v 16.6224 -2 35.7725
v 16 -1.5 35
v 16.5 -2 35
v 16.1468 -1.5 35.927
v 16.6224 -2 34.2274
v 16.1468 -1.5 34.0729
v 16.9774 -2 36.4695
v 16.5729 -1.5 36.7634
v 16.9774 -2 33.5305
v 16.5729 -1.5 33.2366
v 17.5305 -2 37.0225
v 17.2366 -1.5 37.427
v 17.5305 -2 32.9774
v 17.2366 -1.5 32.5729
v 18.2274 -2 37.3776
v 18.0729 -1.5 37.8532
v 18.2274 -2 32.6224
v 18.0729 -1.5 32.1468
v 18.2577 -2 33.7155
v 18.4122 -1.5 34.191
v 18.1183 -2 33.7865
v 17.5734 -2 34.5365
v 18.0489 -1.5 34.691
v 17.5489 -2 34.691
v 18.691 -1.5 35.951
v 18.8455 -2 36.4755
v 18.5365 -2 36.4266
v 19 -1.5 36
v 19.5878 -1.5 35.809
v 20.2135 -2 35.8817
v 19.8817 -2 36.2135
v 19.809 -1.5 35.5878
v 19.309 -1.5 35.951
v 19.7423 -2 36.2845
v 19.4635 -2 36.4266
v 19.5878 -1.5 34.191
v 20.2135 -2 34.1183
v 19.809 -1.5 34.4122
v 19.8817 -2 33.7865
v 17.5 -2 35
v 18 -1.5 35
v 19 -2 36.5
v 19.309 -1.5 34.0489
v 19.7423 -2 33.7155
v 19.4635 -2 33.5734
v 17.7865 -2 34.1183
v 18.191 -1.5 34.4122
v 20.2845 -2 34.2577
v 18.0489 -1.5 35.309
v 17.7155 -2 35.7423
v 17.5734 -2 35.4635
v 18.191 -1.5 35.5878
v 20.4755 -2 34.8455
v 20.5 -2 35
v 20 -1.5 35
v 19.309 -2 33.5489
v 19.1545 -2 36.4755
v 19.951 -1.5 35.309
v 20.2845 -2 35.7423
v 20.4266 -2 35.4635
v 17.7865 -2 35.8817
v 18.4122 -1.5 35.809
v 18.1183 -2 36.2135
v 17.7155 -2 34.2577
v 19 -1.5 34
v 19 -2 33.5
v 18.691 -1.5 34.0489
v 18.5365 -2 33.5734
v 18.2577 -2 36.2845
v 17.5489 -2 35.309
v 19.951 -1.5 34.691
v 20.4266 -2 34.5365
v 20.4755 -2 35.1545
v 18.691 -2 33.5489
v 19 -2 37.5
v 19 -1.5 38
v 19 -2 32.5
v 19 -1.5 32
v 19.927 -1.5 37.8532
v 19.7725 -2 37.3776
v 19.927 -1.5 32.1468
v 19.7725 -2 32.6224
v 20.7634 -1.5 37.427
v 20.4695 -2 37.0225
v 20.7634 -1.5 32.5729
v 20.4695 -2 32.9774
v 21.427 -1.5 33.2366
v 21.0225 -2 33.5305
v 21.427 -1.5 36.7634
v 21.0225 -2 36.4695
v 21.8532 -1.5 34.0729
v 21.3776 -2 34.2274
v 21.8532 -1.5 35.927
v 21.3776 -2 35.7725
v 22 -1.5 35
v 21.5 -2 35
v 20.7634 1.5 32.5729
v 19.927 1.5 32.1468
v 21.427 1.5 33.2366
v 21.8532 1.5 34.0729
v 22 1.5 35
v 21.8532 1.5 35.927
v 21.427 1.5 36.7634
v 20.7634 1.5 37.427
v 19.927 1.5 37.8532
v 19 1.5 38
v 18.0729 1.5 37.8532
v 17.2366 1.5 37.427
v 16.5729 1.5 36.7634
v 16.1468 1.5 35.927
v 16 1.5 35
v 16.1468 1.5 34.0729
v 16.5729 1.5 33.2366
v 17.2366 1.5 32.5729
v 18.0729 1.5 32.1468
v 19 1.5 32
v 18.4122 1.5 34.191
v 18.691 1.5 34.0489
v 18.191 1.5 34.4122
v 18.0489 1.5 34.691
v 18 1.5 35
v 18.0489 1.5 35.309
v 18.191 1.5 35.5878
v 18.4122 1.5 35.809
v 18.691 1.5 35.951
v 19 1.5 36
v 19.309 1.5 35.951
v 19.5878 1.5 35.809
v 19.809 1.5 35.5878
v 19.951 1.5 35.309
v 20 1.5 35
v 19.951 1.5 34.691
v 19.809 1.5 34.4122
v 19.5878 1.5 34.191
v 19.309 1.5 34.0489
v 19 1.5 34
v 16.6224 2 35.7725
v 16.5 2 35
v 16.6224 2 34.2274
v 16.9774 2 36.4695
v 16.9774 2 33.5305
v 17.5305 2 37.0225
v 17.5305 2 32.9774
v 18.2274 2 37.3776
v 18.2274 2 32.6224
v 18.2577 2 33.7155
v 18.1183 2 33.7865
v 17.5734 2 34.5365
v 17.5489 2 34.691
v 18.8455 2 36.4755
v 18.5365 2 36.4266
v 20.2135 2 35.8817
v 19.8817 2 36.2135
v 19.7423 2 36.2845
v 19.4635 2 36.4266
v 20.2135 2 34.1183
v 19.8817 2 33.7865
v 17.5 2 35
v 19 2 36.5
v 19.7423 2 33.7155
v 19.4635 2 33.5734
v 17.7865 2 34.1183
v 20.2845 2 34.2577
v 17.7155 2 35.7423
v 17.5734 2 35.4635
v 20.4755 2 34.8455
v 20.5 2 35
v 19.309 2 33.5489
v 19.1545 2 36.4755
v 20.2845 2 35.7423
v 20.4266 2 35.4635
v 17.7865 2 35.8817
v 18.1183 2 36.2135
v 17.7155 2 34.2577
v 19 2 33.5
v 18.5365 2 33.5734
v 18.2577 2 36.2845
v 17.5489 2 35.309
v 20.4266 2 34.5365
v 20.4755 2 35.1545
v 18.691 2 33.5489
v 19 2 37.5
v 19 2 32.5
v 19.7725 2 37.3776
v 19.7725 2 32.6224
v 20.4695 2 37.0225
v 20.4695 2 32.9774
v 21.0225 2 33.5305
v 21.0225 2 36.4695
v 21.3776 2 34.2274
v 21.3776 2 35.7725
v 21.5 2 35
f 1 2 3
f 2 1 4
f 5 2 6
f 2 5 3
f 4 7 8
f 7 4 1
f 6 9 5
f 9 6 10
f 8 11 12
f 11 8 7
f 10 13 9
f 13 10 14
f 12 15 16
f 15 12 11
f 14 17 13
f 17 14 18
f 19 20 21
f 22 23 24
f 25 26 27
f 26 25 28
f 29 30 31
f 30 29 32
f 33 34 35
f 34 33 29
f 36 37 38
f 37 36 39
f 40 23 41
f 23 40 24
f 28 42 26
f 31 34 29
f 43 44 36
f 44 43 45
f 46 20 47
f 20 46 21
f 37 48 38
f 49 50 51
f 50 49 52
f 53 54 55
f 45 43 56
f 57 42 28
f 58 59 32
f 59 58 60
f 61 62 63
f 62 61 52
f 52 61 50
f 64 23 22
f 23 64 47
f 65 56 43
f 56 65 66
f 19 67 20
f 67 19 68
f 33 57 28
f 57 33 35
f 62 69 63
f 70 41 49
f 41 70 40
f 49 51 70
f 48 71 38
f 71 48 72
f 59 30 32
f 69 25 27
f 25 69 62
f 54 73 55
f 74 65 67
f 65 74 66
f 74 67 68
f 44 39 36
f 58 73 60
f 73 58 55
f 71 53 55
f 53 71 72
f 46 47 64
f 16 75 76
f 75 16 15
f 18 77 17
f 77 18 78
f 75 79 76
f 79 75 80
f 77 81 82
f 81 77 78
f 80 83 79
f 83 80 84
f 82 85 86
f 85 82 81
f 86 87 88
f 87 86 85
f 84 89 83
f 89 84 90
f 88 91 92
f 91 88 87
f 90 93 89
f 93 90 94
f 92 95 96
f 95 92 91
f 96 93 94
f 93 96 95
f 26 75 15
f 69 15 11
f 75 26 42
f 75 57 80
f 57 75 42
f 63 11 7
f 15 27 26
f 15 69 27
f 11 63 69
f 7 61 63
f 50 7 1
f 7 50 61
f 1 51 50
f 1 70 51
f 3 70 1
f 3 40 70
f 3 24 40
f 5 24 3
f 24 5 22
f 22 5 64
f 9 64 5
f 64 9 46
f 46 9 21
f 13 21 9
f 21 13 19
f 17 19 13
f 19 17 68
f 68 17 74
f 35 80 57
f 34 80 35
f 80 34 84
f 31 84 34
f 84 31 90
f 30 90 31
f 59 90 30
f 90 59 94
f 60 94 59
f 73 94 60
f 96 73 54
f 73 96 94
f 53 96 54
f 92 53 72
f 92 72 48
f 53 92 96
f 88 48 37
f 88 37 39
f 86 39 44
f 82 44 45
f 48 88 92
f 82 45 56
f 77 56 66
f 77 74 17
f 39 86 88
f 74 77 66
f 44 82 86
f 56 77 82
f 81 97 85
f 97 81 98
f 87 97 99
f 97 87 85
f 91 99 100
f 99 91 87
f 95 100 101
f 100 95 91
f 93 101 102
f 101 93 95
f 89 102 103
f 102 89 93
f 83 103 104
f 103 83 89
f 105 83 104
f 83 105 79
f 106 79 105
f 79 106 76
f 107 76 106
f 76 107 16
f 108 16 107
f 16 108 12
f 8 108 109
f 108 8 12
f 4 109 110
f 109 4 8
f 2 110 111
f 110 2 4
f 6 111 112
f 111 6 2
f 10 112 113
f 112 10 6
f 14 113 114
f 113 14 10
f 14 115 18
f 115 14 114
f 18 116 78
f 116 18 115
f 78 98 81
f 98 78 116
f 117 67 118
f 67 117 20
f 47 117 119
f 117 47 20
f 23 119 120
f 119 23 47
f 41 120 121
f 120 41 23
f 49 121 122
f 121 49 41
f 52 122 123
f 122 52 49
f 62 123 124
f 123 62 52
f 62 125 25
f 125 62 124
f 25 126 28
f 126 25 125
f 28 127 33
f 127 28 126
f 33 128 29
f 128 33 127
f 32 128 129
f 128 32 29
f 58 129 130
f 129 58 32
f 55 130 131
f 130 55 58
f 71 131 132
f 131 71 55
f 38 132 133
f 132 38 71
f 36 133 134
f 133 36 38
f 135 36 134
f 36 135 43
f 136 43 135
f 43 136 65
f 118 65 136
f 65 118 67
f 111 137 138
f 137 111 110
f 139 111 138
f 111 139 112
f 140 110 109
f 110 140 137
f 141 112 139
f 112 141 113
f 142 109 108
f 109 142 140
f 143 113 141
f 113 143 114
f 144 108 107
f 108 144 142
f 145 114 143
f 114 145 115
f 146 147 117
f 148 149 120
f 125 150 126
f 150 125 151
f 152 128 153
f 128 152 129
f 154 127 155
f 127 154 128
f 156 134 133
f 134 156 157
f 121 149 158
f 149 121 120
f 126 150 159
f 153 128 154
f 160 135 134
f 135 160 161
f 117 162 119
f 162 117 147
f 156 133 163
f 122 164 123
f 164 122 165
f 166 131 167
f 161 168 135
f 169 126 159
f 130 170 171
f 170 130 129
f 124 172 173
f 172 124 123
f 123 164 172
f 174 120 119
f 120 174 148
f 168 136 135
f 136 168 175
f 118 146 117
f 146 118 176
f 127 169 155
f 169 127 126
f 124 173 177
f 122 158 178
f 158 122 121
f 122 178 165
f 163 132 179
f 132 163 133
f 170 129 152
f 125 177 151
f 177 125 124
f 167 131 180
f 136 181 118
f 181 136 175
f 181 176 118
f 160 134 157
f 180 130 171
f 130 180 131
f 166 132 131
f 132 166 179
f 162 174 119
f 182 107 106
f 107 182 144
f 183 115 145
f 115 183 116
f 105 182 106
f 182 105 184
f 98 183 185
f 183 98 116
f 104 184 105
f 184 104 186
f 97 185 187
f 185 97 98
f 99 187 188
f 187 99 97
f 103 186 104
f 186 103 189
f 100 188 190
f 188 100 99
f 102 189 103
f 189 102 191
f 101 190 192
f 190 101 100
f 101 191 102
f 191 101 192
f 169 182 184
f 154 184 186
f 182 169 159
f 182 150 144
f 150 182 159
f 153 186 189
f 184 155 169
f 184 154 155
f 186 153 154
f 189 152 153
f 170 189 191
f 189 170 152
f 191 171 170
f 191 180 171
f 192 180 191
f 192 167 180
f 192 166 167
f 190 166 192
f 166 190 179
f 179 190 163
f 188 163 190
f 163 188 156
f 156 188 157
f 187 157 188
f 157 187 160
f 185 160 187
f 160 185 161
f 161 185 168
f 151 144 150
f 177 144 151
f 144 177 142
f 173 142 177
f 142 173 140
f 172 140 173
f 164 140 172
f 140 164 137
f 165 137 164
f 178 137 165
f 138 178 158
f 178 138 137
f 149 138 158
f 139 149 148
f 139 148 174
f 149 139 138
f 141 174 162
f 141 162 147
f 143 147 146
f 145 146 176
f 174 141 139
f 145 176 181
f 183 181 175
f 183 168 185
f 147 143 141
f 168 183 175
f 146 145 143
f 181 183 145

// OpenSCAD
 $fn = 20; 
// modul amdg_chamfered_logo nahackovan z:
//(c)2018-01-06 Alex Gibson: admg chamfered_logo text module
//Licence: Creative Commons [CC BY-SA 4.0]  https://creativecommons.org/licenses/by-sa/4.0/

module logo () {
	difference () {
	union () {
		translate ([1, 0.5, 0]) offset (delta = 0.5) { resize ([0,50,0],auto=true) import ("magirus.dxf"); }
		translate ([19,35,0]) circle (3);
		}
	translate ([19,35,0])  circle (1);
	}
}


module admg_chamfered_logo (text_depth,chamfer_depth,chamfer_width) {
	translate ([0,0,text_depth-chamfer_depth]) difference() {
		translate ([0,0,-(text_depth-chamfer_depth)]) linear_extrude (text_depth) logo () ;
		minkowski () {
			difference () {
				cube ([500,500,text_depth],center=true);
				translate ([0,0,-text_depth]) linear_extrude (text_depth*2) logo () ;
			}
			translate ([0,0,text_depth/2]) cylinder (chamfer_depth,0,chamfer_width);
		}
	}
}


module final () {
	admg_chamfered_logo(2,0.5,0.5);
	mirror ([0,0,1]) admg_chamfered_logo(2,0.5,0.5);
}

//translate ([0, 0, 0]) logo ();
rotate ([90,0,0]) final ();
